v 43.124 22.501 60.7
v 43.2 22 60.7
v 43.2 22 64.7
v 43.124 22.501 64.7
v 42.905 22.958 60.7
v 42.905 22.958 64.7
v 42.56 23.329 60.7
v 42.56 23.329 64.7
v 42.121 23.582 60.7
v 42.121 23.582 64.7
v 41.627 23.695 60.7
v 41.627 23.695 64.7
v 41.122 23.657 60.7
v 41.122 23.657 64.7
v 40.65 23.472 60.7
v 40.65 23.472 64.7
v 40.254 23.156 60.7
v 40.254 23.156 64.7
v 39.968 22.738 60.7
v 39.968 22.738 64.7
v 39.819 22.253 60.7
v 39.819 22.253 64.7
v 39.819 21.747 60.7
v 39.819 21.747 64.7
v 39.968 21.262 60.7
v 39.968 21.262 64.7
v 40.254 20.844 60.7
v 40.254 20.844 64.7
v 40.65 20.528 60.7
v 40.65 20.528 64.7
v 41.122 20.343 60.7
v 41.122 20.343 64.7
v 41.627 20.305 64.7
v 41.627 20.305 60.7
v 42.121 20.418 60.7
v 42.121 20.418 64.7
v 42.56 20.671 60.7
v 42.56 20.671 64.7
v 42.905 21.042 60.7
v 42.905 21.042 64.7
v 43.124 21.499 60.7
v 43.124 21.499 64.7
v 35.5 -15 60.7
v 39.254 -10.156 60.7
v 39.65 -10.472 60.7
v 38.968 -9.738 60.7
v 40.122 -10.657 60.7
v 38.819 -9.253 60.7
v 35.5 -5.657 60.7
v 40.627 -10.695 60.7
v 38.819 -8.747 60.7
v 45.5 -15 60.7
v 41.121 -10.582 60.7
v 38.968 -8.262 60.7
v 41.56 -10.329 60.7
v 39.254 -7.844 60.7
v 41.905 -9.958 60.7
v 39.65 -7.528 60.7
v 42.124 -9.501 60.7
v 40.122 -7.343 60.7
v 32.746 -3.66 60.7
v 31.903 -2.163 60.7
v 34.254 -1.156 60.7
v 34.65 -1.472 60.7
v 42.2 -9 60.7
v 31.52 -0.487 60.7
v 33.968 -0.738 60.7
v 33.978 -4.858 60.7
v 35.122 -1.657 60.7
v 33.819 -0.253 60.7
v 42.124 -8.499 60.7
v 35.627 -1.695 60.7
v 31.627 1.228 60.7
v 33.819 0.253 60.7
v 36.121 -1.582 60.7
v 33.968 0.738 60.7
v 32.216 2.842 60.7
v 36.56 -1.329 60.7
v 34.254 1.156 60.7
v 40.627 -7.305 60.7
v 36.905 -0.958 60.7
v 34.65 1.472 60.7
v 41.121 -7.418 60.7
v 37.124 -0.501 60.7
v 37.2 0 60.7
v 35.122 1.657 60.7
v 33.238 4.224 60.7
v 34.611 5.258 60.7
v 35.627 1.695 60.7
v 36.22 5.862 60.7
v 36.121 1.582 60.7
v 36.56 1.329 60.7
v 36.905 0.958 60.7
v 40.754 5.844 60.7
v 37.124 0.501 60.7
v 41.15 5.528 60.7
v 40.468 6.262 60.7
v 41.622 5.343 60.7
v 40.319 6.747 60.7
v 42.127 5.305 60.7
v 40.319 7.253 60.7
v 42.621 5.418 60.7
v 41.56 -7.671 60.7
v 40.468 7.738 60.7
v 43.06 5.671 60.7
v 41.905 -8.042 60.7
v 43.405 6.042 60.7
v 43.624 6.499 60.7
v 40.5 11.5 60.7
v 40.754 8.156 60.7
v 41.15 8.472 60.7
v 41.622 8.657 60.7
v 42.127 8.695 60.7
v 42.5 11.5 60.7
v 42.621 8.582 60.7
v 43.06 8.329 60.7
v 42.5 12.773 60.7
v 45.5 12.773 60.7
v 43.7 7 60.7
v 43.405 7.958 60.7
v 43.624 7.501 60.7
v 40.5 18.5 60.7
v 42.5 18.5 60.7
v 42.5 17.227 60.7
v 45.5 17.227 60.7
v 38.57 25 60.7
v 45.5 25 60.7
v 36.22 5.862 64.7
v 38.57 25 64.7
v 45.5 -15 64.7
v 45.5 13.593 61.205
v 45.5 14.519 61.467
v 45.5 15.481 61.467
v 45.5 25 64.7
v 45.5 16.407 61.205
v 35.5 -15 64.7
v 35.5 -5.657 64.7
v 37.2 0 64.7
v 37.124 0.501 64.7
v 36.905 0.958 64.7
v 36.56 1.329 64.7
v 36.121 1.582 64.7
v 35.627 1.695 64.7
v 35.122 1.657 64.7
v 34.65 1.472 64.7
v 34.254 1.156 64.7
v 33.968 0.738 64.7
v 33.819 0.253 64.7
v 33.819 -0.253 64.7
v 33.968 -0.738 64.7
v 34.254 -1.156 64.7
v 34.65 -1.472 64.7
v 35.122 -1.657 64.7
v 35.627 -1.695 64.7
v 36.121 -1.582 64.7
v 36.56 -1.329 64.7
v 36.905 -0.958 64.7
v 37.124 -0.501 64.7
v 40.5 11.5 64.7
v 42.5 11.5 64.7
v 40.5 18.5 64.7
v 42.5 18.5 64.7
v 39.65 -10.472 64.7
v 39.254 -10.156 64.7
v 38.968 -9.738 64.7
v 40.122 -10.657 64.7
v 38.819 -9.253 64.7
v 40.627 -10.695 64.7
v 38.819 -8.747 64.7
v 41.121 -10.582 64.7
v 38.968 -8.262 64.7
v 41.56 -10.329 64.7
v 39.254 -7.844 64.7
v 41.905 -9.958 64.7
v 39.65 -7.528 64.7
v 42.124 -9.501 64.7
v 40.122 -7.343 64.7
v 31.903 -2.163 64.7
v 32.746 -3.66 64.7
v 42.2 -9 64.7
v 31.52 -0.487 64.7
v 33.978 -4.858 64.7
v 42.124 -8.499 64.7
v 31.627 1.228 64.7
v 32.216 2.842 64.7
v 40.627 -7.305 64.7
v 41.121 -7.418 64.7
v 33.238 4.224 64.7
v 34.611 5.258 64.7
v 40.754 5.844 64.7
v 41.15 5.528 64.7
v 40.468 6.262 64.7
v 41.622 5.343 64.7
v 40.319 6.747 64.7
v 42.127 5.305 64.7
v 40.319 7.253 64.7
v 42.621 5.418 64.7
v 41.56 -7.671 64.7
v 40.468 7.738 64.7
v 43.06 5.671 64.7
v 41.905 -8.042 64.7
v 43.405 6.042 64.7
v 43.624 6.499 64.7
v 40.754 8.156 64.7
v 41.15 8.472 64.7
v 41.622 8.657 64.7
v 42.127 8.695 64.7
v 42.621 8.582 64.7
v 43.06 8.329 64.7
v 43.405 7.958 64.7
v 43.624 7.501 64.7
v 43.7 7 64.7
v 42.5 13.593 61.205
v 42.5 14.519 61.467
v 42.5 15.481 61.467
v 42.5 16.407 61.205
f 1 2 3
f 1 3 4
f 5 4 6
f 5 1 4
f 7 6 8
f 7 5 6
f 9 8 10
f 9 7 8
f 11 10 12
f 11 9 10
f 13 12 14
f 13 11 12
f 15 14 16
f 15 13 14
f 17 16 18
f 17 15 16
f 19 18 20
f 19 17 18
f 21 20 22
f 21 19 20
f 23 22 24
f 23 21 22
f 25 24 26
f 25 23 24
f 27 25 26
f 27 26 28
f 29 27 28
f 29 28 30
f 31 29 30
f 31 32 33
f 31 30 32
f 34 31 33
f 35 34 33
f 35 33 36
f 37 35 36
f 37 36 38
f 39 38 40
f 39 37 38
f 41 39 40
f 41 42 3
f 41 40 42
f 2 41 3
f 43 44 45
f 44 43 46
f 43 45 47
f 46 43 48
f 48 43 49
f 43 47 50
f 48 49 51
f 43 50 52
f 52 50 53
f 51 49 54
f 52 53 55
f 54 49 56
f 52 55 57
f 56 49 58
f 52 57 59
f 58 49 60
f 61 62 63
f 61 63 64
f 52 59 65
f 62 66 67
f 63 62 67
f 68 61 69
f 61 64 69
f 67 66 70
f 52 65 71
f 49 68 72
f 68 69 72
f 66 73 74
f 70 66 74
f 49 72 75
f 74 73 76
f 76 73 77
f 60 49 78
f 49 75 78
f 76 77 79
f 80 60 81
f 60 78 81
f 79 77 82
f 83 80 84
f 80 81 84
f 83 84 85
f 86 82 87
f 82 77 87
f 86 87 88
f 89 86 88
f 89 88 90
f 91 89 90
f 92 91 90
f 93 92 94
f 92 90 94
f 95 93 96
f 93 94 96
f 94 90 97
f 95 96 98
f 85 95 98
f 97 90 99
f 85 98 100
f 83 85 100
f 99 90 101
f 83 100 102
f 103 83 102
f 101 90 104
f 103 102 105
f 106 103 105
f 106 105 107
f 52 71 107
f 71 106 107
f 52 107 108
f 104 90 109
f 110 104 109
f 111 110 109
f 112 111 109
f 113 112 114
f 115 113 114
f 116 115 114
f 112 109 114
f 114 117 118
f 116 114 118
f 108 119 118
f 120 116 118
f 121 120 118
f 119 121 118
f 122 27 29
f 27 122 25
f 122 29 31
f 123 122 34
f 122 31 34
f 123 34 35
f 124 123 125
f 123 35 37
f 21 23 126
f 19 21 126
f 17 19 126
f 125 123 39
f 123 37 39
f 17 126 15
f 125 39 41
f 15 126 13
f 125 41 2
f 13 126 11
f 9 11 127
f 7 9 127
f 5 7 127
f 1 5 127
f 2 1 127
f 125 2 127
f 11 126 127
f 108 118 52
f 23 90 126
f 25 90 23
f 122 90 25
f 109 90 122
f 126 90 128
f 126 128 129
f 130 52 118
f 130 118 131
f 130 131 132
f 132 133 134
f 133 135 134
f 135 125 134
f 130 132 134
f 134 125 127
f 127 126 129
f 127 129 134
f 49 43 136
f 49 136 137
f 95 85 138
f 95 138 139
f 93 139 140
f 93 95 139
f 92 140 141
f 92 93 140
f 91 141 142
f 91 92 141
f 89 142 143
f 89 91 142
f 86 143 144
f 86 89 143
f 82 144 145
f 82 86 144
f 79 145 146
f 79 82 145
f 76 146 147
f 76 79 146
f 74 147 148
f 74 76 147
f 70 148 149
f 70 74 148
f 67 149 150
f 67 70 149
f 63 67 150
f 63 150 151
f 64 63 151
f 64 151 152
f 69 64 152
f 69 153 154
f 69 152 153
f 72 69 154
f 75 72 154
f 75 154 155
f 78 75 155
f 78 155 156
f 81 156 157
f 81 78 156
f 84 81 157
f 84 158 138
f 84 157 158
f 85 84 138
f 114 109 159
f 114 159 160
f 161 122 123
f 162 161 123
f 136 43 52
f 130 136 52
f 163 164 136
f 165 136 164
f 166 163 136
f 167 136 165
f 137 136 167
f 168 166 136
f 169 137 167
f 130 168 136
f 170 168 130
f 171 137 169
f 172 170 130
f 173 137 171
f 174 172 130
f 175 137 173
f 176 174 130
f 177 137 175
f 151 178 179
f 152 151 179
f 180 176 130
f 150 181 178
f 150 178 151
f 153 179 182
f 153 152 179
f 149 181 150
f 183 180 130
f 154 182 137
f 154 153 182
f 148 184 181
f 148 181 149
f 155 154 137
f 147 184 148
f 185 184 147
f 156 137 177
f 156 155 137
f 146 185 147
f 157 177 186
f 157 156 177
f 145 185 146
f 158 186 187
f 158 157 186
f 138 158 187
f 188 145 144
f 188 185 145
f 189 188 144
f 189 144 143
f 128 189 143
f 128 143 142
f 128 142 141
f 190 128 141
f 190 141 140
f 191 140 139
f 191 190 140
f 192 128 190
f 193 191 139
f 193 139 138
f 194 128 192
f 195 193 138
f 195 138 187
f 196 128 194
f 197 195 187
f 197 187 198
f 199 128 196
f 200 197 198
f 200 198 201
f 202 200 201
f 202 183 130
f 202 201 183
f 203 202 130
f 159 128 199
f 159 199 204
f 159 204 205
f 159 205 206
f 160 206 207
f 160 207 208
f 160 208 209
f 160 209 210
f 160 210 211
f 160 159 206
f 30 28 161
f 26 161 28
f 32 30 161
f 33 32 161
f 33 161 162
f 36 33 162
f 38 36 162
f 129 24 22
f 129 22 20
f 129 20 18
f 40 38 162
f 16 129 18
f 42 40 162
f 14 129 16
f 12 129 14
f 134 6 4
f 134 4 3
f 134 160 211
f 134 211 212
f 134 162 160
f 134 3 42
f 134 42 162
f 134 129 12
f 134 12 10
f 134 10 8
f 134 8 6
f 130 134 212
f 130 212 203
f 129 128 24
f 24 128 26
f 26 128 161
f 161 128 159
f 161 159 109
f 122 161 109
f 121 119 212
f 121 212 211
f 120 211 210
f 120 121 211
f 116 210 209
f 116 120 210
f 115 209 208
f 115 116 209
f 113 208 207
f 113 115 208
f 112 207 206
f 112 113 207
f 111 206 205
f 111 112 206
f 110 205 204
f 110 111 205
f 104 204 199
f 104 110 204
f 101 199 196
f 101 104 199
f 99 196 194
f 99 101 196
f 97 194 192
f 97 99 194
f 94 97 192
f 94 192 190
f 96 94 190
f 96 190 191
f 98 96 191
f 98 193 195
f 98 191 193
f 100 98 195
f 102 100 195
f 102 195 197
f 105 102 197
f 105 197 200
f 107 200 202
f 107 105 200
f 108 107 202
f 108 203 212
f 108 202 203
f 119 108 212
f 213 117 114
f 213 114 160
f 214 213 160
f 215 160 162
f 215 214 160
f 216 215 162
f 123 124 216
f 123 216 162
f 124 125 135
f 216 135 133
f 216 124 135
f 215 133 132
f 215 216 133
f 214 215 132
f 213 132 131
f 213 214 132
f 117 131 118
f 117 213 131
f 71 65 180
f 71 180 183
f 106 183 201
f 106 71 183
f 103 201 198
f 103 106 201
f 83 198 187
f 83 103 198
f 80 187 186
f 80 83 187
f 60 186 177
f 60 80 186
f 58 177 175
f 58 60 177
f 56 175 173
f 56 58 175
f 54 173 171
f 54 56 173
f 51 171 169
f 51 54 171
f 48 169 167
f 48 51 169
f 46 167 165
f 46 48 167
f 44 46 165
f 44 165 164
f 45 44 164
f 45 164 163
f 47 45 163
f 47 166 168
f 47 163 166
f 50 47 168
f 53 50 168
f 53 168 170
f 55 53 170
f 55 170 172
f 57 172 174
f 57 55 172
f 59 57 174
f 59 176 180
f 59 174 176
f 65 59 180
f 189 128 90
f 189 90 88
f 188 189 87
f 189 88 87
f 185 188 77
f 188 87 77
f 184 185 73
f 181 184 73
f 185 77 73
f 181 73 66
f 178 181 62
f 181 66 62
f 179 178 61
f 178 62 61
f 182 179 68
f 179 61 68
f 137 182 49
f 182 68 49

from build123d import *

# Parameters (mm, degrees)
CYLINDER082_R           = 1.7
CYLINDER082_DEPTH       = 50
CYLINDER081_R           = 1.7
CYLINDER081_DEPTH       = 50
CYLINDER080_R           = 1.7
CYLINDER080_DEPTH       = 50
CYLINDER079_R           = 1.7
CYLINDER079_DEPTH       = 50
CYLINDER044_R           = 3.5
CYLINDER044_DEPTH       = 8
CYLINDER044_PITCH_ANGLE = 90
BOX027_W                = 2
BOX027_H                = 7
BOX027_DEPTH            = 10
BOX019_W                = 66
BOX019_H                = 50
BOX019_DEPTH            = 25
BOX019_PLACEMENT_ANGLE  = -7
BOX010_W                = 10
BOX010_H                = 40
BOX010_DEPTH            = 4
CYLINDER024_R           = 6
CYLINDER024_DEPTH       = 4


with BuildPart() as m3_studding019:
    # Cylinder082 → Cylinder082 (new body)
    with BuildSketch(Plane(origin=(41, -9, 27), x_dir=(1, 0, 0), z_dir=(0, 0, 1))):
        Circle(CYLINDER082_R)
    extrude(amount=CYLINDER082_DEPTH)


with BuildPart() as m3_studding018:
    # Cylinder081 → Cylinder081 (new body)
    with BuildSketch(Plane(origin=(42, 22, 27), x_dir=(1, 0, 0), z_dir=(0, 0, 1))):
        Circle(CYLINDER081_R)
    extrude(amount=CYLINDER081_DEPTH)


with BuildPart() as m3_studding017:
    # Cylinder080 → Cylinder080 (new body)
    with BuildSketch(Plane(origin=(42.5, 7, 27), x_dir=(1, 0, 0), z_dir=(0, 0, 1))):
        Circle(CYLINDER080_R)
    extrude(amount=CYLINDER080_DEPTH)


with BuildPart() as m3_clearance003:
    # Cylinder079 → Cylinder079 (new body)
    with BuildSketch(Plane(origin=(36, 0, 27), x_dir=(1, 0, 0), z_dir=(0, 0, 1))):
        Circle(CYLINDER079_R)
    extrude(amount=CYLINDER079_DEPTH)

    # Fusion048: union m3-studding019, m3-studding018, m3-studding017
    add(m3_studding019.part)
    add(m3_studding018.part)
    add(m3_studding017.part)


with BuildPart() as cylinder044:
    # Cylinder044 → Cylinder044 (new body)
    with BuildSketch(Plane.XY):
        Circle(CYLINDER044_R)
    extrude(amount=CYLINDER044_DEPTH)


with BuildPart() as cylinder044_1:
    # Cylinder044 pitch: moved
    add(cylinder044.part.rotate(Axis((0, 0, 0), (0, 1, 0)), CYLINDER044_PITCH_ANGLE))


with BuildPart() as cylinder044_2:
    # Cylinder044 placement: moved
    add(cylinder044_1.part.moved(Location((41, 15, 58))))


with BuildPart() as sprint_adj_hole:
    # Box027 → Box027 (new body)
    with BuildSketch(Plane(origin=(41, 11.5, 58), x_dir=(1, 0, 0), z_dir=(0, 0, 1))):
        with Locations((1, 3.5)):
            Rectangle(BOX027_W, BOX027_H)
    extrude(amount=BOX027_DEPTH)

    # Fusion026: union Cylinder044
    add(cylinder044_2.part)


with BuildPart() as cube019:
    # Box019 → Box019 (new body)
    with BuildSketch(Plane.XY):
        with Locations((33, 25)):
            Rectangle(BOX019_W, BOX019_H)
    extrude(amount=BOX019_DEPTH)


with BuildPart() as cube019_1:
    # Box019 placement: moved
    add(cube019.part.moved(Location((-31.823564, -10.815, 45))).rotate(Axis((-31.823564, -10.815, 45), (0, 0, 1)), BOX019_PLACEMENT_ANGLE))


with BuildPart() as cut008:
    # Box010 → Box010 (new body)
    with BuildSketch(Plane(origin=(36, -15, 60.7), x_dir=(1, 0, 0), z_dir=(0, 0, 1))):
        with Locations((5, 20)):
            Rectangle(BOX010_W, BOX010_H)
    extrude(amount=BOX010_DEPTH)

    # Cut008: cut Cube019
    add(cube019_1.part, mode=Mode.SUBTRACT)


with BuildPart() as clamp_plate:
    # Cylinder024 → Cylinder024 (new body)
    with BuildSketch(Plane(origin=(38, 0, 60.7), x_dir=(1, 0, 0), z_dir=(0, 0, 1))):
        Circle(CYLINDER024_R)
    extrude(amount=CYLINDER024_DEPTH)

    # Fusion013: union Cut008
    add(cut008.part)

    # Cut016: cut sprint-adj-hole
    add(sprint_adj_hole.part, mode=Mode.SUBTRACT)

    # Cut038: cut M3-clearance003
    add(m3_clearance003.part, mode=Mode.SUBTRACT)


with BuildPart() as clamp_plate_1:
    # Cut038 placement: moved
    add(clamp_plate.part.moved(Location((-0.5, 0, 0))))


solid = clamp_plate_1.part
